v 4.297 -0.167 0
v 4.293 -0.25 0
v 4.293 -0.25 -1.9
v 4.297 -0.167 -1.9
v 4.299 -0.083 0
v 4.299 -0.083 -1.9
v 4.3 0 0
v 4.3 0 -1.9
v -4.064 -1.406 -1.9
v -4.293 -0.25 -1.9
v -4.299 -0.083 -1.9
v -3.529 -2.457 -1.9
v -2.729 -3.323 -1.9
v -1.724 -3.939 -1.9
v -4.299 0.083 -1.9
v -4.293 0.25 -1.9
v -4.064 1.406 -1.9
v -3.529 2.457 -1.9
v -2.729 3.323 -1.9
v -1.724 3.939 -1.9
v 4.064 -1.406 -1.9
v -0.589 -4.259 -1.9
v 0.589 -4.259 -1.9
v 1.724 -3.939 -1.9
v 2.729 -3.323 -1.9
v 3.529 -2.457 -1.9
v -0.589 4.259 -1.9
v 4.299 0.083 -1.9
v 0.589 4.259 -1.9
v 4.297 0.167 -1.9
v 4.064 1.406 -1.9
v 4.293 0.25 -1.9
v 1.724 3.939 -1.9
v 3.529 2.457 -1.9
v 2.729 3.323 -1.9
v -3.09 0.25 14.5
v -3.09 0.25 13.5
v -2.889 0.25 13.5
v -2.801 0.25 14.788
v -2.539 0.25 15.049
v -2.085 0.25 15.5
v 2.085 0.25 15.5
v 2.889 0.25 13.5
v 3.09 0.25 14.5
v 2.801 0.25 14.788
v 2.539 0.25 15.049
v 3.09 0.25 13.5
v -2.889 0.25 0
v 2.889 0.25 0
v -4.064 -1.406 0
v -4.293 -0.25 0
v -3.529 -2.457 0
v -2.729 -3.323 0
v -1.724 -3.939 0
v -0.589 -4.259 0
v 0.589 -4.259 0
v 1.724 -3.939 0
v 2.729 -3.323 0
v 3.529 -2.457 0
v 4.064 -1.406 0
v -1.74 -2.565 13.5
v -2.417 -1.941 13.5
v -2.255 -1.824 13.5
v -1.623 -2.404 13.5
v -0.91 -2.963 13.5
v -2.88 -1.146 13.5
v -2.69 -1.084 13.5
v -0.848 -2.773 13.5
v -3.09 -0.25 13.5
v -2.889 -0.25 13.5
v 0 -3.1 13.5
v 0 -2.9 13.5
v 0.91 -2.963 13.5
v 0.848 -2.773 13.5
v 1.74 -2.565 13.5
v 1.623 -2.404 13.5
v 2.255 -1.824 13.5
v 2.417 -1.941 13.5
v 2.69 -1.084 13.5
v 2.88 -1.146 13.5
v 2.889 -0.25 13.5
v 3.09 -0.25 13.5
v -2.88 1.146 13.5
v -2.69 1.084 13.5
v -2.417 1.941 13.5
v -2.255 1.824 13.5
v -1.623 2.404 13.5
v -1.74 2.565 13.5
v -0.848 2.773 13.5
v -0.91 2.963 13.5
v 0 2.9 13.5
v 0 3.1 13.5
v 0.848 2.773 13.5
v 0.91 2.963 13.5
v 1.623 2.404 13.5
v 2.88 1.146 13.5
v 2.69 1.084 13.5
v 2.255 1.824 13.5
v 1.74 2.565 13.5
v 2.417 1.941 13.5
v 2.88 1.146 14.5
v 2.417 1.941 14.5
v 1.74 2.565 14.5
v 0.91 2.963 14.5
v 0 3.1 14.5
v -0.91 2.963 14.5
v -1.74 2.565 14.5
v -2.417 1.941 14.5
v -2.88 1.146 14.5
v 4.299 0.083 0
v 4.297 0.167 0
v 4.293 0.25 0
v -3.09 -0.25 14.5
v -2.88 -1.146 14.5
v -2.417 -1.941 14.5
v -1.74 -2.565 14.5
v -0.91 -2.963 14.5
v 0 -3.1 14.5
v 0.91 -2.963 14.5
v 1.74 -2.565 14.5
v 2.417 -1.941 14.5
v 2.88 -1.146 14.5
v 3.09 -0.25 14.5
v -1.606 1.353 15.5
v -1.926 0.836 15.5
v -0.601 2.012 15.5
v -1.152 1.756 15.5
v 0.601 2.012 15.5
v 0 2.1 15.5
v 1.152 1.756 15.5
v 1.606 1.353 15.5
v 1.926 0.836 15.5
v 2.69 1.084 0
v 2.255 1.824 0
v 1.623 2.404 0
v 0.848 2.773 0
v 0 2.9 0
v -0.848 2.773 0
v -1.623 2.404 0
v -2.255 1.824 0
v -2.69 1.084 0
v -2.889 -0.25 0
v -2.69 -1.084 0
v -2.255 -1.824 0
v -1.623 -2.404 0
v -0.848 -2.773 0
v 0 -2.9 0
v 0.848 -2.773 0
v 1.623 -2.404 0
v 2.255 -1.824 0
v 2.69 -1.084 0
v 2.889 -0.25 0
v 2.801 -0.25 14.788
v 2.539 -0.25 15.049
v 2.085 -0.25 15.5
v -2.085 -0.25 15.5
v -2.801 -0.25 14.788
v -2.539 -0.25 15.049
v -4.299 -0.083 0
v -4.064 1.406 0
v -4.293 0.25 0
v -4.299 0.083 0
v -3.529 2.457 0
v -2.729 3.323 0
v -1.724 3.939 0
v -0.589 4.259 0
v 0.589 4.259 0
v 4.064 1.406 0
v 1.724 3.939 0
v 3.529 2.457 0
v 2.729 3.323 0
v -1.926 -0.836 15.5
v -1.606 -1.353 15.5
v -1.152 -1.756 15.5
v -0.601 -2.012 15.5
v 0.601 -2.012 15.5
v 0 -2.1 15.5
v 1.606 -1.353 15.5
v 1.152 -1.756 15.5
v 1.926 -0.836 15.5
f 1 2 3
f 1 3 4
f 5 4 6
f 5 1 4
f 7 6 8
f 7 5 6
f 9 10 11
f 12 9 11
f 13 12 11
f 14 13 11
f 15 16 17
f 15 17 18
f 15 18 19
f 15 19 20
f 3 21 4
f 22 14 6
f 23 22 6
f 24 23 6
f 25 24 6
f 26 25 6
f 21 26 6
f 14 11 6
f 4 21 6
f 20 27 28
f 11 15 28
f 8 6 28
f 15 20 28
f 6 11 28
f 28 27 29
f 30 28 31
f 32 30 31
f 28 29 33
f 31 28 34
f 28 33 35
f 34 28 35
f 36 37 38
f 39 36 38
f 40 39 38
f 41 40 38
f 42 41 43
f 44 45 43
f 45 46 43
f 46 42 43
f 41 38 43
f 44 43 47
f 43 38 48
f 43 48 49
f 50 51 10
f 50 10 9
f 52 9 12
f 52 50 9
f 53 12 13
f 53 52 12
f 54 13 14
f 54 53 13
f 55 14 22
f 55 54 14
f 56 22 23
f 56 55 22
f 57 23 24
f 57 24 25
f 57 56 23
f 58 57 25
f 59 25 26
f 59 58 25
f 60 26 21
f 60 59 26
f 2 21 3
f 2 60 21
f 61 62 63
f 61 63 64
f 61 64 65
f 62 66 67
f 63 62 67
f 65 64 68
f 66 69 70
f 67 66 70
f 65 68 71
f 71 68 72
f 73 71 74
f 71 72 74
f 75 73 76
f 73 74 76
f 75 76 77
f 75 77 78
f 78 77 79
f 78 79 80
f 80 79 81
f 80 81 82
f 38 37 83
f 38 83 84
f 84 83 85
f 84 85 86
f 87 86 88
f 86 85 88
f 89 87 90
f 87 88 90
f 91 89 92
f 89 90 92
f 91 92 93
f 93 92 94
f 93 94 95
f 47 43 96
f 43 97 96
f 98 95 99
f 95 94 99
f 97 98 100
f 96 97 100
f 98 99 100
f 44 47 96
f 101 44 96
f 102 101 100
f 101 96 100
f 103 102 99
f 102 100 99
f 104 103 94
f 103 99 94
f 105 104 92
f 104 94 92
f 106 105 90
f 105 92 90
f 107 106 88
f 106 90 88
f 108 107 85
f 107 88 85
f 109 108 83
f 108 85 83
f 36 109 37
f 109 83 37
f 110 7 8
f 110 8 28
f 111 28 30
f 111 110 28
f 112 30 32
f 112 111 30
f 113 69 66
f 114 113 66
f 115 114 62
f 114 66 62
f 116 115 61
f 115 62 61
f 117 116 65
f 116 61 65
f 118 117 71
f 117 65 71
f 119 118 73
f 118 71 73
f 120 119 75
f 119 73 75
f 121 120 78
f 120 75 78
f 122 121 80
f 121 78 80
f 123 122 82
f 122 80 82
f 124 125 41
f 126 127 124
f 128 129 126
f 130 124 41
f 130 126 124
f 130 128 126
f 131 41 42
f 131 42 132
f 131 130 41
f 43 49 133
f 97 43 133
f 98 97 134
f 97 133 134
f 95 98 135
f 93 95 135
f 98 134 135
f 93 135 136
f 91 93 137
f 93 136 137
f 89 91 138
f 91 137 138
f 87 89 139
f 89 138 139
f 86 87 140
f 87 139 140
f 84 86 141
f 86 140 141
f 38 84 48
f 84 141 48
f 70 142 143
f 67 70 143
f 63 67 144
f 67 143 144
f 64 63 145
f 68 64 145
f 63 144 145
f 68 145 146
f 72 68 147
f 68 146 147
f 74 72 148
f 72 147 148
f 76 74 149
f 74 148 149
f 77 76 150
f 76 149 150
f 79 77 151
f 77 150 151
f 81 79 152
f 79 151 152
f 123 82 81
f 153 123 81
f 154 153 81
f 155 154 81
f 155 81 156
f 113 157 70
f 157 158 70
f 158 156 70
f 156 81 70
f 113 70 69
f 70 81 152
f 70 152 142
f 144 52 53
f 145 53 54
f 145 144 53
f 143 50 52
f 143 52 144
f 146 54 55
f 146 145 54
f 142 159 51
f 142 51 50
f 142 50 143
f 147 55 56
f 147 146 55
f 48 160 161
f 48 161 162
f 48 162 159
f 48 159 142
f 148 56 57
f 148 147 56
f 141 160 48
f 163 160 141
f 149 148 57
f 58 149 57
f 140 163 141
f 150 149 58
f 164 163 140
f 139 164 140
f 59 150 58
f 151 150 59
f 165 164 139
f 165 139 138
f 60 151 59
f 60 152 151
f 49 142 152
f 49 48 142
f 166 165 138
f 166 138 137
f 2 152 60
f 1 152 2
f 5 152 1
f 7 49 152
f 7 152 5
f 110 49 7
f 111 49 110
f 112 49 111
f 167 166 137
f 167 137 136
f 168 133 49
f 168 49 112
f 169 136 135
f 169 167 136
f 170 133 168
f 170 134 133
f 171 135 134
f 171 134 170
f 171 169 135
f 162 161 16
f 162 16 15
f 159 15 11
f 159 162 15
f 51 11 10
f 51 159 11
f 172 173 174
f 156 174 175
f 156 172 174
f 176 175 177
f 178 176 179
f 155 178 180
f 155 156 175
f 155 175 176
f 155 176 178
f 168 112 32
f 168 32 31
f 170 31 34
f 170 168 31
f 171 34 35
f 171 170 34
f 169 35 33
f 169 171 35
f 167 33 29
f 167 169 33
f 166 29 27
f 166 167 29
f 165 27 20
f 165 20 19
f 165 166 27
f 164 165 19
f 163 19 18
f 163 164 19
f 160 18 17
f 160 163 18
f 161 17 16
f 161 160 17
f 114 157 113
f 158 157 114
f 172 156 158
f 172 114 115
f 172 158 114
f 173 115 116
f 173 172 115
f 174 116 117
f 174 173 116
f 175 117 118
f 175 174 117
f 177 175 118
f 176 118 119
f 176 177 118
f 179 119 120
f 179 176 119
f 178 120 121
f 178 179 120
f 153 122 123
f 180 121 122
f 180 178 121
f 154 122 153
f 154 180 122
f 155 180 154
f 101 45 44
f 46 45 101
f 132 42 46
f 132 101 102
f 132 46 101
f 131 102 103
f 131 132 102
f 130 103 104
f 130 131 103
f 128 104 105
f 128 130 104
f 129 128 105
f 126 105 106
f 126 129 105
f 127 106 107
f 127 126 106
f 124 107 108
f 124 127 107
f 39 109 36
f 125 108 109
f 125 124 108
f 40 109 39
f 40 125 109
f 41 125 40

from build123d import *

# Parameters (mm, degrees)
F1_DEPTH = 1.9
F2_DEPTH = 13.5
F4_DEPTH = 2
F5_SIZE  = 1


with BuildPart() as f1:
    # F0 (on Top) → F1 (new body)
    with BuildSketch(Plane.XY):
        with BuildLine():
            Line((2.8892040426, 0.25), (4.2927264064, 0.25))
            ThreePointArc((4.2927264064, 0.25), (0, 4.3), (-4.2927264064, 0.25))
            Line((-4.2927264064, 0.25), (-2.8892040426, 0.25))
            ThreePointArc((-2.8892040426, 0.25), (0, 2.9), (2.8892040426, 0.25))
        make_face()
        with BuildLine():
            Line((0, 0.25), (2.8892040426, 0.25))
            ThreePointArc((2.8892040426, 0.25), (0, 2.9), (-2.8892040426, 0.25))
            Line((-2.8892040426, 0.25), (0, 0.25))
        make_face()
        with BuildLine():
            Line((-2.8892040426, 0.25), (-4.2927264064, 0.25))
            ThreePointArc((-4.2927264064, 0.25), (-4.3, 0), (-4.2927264064, -0.25))
            Line((-4.2927264064, -0.25), (-2.8892040426, -0.25))
            ThreePointArc((-2.8892040426, -0.25), (-2.9, 0), (-2.8892040426, 0.25))
        make_face()
        with BuildLine():
            ThreePointArc((4.2927264064, -0.25), (4.2981812169, -0.125052894), (4.3, 0))
            ThreePointArc((4.3, 0), (4.2981812169, 0.125052894), (4.2927264064, 0.25))
            Line((4.2927264064, 0.25), (2.8892040426, 0.25))
            ThreePointArc((2.8892040426, 0.25), (2.8972997535, 0.1251164984), (2.9, 0))
            ThreePointArc((2.9, 0), (2.8972997535, -0.1251164984), (2.8892040426, -0.25))
            Line((2.8892040426, -0.25), (4.2927264064, -0.25))
        make_face()
        with BuildLine():
            ThreePointArc((-4.2927264064, -0.25), (0, -4.3), (4.2927264064, -0.25))
            Line((4.2927264064, -0.25), (2.8892040426, -0.25))
            ThreePointArc((2.8892040426, -0.25), (0, -2.9), (-2.8892040426, -0.25))
            Line((-2.8892040426, -0.25), (-4.2927264064, -0.25))
        make_face()
        with BuildLine():
            ThreePointArc((-2.8892040426, -0.25), (0, -2.9), (2.8892040426, -0.25))
            Line((2.8892040426, -0.25), (0, -0.25))
            Line((0, -0.25), (-2.8892040426, -0.25))
        make_face()
        with BuildLine():
            ThreePointArc((2.9, 0), (2.8972997535, 0.1251164984), (2.8892040426, 0.25))
            Line((2.8892040426, 0.25), (0, 0.25))
            Line((0, 0.25), (-2.8892040426, 0.25))
            ThreePointArc((-2.8892040426, 0.25), (-2.9, 0), (-2.8892040426, -0.25))
            Line((-2.8892040426, -0.25), (0, -0.25))
            Line((0, -0.25), (2.8892040426, -0.25))
            ThreePointArc((2.8892040426, -0.25), (2.8972997535, -0.1251164984), (2.9, 0))
        make_face()
    extrude(amount=-F1_DEPTH)

    # F0 (on Top) → F2 (join)
    with BuildSketch(Plane.XY):
        with BuildLine():
            ThreePointArc((-2.8892040426, -0.25), (0, -2.9), (2.8892040426, -0.25))
            Line((2.8892040426, -0.25), (0, -0.25))
            Line((0, -0.25), (-2.8892040426, -0.25))
        make_face()
        with BuildLine():
            Line((0, 0.25), (2.8892040426, 0.25))
            ThreePointArc((2.8892040426, 0.25), (0, 2.9), (-2.8892040426, 0.25))
            Line((-2.8892040426, 0.25), (0, 0.25))
        make_face()
    extrude(amount=F2_DEPTH)

    # F3 (on face) → F4 (join)
    with BuildSketch(Plane.XY.offset(13.5)):
        with BuildLine():
            ThreePointArc((-3.0899029111, -0.25), (0, -3.1), (3.0899029111, -0.25))
            Line((3.0899029111, -0.25), (0, -0.25))
            Line((0, -0.25), (-3.0899029111, -0.25))
        make_face()
        with BuildLine():
            Line((0, 0.25), (2.8892040426, 0.25))
            ThreePointArc((2.8892040426, 0.25), (0, 2.9), (-2.8892040426, 0.25))
            Line((-2.8892040426, 0.25), (0, 0.25))
        make_face()
        with BuildLine():
            Line((2.8892040426, 0.25), (3.0899029111, 0.25))
            ThreePointArc((3.0899029111, 0.25), (0, 3.1), (-3.0899029111, 0.25))
            Line((-3.0899029111, 0.25), (-2.8892040426, 0.25))
            ThreePointArc((-2.8892040426, 0.25), (0, 2.9), (2.8892040426, 0.25))
        make_face()
    extrude(amount=F4_DEPTH)

    # F5
    f5_edges = [f1.edges().sort_by_distance(p)[0] for p in [
        (0, 3.1, 15.5),
        (0, -3.1, 15.5),
    ]]
    chamfer(f5_edges, length=F5_SIZE)


solid = f1.part
